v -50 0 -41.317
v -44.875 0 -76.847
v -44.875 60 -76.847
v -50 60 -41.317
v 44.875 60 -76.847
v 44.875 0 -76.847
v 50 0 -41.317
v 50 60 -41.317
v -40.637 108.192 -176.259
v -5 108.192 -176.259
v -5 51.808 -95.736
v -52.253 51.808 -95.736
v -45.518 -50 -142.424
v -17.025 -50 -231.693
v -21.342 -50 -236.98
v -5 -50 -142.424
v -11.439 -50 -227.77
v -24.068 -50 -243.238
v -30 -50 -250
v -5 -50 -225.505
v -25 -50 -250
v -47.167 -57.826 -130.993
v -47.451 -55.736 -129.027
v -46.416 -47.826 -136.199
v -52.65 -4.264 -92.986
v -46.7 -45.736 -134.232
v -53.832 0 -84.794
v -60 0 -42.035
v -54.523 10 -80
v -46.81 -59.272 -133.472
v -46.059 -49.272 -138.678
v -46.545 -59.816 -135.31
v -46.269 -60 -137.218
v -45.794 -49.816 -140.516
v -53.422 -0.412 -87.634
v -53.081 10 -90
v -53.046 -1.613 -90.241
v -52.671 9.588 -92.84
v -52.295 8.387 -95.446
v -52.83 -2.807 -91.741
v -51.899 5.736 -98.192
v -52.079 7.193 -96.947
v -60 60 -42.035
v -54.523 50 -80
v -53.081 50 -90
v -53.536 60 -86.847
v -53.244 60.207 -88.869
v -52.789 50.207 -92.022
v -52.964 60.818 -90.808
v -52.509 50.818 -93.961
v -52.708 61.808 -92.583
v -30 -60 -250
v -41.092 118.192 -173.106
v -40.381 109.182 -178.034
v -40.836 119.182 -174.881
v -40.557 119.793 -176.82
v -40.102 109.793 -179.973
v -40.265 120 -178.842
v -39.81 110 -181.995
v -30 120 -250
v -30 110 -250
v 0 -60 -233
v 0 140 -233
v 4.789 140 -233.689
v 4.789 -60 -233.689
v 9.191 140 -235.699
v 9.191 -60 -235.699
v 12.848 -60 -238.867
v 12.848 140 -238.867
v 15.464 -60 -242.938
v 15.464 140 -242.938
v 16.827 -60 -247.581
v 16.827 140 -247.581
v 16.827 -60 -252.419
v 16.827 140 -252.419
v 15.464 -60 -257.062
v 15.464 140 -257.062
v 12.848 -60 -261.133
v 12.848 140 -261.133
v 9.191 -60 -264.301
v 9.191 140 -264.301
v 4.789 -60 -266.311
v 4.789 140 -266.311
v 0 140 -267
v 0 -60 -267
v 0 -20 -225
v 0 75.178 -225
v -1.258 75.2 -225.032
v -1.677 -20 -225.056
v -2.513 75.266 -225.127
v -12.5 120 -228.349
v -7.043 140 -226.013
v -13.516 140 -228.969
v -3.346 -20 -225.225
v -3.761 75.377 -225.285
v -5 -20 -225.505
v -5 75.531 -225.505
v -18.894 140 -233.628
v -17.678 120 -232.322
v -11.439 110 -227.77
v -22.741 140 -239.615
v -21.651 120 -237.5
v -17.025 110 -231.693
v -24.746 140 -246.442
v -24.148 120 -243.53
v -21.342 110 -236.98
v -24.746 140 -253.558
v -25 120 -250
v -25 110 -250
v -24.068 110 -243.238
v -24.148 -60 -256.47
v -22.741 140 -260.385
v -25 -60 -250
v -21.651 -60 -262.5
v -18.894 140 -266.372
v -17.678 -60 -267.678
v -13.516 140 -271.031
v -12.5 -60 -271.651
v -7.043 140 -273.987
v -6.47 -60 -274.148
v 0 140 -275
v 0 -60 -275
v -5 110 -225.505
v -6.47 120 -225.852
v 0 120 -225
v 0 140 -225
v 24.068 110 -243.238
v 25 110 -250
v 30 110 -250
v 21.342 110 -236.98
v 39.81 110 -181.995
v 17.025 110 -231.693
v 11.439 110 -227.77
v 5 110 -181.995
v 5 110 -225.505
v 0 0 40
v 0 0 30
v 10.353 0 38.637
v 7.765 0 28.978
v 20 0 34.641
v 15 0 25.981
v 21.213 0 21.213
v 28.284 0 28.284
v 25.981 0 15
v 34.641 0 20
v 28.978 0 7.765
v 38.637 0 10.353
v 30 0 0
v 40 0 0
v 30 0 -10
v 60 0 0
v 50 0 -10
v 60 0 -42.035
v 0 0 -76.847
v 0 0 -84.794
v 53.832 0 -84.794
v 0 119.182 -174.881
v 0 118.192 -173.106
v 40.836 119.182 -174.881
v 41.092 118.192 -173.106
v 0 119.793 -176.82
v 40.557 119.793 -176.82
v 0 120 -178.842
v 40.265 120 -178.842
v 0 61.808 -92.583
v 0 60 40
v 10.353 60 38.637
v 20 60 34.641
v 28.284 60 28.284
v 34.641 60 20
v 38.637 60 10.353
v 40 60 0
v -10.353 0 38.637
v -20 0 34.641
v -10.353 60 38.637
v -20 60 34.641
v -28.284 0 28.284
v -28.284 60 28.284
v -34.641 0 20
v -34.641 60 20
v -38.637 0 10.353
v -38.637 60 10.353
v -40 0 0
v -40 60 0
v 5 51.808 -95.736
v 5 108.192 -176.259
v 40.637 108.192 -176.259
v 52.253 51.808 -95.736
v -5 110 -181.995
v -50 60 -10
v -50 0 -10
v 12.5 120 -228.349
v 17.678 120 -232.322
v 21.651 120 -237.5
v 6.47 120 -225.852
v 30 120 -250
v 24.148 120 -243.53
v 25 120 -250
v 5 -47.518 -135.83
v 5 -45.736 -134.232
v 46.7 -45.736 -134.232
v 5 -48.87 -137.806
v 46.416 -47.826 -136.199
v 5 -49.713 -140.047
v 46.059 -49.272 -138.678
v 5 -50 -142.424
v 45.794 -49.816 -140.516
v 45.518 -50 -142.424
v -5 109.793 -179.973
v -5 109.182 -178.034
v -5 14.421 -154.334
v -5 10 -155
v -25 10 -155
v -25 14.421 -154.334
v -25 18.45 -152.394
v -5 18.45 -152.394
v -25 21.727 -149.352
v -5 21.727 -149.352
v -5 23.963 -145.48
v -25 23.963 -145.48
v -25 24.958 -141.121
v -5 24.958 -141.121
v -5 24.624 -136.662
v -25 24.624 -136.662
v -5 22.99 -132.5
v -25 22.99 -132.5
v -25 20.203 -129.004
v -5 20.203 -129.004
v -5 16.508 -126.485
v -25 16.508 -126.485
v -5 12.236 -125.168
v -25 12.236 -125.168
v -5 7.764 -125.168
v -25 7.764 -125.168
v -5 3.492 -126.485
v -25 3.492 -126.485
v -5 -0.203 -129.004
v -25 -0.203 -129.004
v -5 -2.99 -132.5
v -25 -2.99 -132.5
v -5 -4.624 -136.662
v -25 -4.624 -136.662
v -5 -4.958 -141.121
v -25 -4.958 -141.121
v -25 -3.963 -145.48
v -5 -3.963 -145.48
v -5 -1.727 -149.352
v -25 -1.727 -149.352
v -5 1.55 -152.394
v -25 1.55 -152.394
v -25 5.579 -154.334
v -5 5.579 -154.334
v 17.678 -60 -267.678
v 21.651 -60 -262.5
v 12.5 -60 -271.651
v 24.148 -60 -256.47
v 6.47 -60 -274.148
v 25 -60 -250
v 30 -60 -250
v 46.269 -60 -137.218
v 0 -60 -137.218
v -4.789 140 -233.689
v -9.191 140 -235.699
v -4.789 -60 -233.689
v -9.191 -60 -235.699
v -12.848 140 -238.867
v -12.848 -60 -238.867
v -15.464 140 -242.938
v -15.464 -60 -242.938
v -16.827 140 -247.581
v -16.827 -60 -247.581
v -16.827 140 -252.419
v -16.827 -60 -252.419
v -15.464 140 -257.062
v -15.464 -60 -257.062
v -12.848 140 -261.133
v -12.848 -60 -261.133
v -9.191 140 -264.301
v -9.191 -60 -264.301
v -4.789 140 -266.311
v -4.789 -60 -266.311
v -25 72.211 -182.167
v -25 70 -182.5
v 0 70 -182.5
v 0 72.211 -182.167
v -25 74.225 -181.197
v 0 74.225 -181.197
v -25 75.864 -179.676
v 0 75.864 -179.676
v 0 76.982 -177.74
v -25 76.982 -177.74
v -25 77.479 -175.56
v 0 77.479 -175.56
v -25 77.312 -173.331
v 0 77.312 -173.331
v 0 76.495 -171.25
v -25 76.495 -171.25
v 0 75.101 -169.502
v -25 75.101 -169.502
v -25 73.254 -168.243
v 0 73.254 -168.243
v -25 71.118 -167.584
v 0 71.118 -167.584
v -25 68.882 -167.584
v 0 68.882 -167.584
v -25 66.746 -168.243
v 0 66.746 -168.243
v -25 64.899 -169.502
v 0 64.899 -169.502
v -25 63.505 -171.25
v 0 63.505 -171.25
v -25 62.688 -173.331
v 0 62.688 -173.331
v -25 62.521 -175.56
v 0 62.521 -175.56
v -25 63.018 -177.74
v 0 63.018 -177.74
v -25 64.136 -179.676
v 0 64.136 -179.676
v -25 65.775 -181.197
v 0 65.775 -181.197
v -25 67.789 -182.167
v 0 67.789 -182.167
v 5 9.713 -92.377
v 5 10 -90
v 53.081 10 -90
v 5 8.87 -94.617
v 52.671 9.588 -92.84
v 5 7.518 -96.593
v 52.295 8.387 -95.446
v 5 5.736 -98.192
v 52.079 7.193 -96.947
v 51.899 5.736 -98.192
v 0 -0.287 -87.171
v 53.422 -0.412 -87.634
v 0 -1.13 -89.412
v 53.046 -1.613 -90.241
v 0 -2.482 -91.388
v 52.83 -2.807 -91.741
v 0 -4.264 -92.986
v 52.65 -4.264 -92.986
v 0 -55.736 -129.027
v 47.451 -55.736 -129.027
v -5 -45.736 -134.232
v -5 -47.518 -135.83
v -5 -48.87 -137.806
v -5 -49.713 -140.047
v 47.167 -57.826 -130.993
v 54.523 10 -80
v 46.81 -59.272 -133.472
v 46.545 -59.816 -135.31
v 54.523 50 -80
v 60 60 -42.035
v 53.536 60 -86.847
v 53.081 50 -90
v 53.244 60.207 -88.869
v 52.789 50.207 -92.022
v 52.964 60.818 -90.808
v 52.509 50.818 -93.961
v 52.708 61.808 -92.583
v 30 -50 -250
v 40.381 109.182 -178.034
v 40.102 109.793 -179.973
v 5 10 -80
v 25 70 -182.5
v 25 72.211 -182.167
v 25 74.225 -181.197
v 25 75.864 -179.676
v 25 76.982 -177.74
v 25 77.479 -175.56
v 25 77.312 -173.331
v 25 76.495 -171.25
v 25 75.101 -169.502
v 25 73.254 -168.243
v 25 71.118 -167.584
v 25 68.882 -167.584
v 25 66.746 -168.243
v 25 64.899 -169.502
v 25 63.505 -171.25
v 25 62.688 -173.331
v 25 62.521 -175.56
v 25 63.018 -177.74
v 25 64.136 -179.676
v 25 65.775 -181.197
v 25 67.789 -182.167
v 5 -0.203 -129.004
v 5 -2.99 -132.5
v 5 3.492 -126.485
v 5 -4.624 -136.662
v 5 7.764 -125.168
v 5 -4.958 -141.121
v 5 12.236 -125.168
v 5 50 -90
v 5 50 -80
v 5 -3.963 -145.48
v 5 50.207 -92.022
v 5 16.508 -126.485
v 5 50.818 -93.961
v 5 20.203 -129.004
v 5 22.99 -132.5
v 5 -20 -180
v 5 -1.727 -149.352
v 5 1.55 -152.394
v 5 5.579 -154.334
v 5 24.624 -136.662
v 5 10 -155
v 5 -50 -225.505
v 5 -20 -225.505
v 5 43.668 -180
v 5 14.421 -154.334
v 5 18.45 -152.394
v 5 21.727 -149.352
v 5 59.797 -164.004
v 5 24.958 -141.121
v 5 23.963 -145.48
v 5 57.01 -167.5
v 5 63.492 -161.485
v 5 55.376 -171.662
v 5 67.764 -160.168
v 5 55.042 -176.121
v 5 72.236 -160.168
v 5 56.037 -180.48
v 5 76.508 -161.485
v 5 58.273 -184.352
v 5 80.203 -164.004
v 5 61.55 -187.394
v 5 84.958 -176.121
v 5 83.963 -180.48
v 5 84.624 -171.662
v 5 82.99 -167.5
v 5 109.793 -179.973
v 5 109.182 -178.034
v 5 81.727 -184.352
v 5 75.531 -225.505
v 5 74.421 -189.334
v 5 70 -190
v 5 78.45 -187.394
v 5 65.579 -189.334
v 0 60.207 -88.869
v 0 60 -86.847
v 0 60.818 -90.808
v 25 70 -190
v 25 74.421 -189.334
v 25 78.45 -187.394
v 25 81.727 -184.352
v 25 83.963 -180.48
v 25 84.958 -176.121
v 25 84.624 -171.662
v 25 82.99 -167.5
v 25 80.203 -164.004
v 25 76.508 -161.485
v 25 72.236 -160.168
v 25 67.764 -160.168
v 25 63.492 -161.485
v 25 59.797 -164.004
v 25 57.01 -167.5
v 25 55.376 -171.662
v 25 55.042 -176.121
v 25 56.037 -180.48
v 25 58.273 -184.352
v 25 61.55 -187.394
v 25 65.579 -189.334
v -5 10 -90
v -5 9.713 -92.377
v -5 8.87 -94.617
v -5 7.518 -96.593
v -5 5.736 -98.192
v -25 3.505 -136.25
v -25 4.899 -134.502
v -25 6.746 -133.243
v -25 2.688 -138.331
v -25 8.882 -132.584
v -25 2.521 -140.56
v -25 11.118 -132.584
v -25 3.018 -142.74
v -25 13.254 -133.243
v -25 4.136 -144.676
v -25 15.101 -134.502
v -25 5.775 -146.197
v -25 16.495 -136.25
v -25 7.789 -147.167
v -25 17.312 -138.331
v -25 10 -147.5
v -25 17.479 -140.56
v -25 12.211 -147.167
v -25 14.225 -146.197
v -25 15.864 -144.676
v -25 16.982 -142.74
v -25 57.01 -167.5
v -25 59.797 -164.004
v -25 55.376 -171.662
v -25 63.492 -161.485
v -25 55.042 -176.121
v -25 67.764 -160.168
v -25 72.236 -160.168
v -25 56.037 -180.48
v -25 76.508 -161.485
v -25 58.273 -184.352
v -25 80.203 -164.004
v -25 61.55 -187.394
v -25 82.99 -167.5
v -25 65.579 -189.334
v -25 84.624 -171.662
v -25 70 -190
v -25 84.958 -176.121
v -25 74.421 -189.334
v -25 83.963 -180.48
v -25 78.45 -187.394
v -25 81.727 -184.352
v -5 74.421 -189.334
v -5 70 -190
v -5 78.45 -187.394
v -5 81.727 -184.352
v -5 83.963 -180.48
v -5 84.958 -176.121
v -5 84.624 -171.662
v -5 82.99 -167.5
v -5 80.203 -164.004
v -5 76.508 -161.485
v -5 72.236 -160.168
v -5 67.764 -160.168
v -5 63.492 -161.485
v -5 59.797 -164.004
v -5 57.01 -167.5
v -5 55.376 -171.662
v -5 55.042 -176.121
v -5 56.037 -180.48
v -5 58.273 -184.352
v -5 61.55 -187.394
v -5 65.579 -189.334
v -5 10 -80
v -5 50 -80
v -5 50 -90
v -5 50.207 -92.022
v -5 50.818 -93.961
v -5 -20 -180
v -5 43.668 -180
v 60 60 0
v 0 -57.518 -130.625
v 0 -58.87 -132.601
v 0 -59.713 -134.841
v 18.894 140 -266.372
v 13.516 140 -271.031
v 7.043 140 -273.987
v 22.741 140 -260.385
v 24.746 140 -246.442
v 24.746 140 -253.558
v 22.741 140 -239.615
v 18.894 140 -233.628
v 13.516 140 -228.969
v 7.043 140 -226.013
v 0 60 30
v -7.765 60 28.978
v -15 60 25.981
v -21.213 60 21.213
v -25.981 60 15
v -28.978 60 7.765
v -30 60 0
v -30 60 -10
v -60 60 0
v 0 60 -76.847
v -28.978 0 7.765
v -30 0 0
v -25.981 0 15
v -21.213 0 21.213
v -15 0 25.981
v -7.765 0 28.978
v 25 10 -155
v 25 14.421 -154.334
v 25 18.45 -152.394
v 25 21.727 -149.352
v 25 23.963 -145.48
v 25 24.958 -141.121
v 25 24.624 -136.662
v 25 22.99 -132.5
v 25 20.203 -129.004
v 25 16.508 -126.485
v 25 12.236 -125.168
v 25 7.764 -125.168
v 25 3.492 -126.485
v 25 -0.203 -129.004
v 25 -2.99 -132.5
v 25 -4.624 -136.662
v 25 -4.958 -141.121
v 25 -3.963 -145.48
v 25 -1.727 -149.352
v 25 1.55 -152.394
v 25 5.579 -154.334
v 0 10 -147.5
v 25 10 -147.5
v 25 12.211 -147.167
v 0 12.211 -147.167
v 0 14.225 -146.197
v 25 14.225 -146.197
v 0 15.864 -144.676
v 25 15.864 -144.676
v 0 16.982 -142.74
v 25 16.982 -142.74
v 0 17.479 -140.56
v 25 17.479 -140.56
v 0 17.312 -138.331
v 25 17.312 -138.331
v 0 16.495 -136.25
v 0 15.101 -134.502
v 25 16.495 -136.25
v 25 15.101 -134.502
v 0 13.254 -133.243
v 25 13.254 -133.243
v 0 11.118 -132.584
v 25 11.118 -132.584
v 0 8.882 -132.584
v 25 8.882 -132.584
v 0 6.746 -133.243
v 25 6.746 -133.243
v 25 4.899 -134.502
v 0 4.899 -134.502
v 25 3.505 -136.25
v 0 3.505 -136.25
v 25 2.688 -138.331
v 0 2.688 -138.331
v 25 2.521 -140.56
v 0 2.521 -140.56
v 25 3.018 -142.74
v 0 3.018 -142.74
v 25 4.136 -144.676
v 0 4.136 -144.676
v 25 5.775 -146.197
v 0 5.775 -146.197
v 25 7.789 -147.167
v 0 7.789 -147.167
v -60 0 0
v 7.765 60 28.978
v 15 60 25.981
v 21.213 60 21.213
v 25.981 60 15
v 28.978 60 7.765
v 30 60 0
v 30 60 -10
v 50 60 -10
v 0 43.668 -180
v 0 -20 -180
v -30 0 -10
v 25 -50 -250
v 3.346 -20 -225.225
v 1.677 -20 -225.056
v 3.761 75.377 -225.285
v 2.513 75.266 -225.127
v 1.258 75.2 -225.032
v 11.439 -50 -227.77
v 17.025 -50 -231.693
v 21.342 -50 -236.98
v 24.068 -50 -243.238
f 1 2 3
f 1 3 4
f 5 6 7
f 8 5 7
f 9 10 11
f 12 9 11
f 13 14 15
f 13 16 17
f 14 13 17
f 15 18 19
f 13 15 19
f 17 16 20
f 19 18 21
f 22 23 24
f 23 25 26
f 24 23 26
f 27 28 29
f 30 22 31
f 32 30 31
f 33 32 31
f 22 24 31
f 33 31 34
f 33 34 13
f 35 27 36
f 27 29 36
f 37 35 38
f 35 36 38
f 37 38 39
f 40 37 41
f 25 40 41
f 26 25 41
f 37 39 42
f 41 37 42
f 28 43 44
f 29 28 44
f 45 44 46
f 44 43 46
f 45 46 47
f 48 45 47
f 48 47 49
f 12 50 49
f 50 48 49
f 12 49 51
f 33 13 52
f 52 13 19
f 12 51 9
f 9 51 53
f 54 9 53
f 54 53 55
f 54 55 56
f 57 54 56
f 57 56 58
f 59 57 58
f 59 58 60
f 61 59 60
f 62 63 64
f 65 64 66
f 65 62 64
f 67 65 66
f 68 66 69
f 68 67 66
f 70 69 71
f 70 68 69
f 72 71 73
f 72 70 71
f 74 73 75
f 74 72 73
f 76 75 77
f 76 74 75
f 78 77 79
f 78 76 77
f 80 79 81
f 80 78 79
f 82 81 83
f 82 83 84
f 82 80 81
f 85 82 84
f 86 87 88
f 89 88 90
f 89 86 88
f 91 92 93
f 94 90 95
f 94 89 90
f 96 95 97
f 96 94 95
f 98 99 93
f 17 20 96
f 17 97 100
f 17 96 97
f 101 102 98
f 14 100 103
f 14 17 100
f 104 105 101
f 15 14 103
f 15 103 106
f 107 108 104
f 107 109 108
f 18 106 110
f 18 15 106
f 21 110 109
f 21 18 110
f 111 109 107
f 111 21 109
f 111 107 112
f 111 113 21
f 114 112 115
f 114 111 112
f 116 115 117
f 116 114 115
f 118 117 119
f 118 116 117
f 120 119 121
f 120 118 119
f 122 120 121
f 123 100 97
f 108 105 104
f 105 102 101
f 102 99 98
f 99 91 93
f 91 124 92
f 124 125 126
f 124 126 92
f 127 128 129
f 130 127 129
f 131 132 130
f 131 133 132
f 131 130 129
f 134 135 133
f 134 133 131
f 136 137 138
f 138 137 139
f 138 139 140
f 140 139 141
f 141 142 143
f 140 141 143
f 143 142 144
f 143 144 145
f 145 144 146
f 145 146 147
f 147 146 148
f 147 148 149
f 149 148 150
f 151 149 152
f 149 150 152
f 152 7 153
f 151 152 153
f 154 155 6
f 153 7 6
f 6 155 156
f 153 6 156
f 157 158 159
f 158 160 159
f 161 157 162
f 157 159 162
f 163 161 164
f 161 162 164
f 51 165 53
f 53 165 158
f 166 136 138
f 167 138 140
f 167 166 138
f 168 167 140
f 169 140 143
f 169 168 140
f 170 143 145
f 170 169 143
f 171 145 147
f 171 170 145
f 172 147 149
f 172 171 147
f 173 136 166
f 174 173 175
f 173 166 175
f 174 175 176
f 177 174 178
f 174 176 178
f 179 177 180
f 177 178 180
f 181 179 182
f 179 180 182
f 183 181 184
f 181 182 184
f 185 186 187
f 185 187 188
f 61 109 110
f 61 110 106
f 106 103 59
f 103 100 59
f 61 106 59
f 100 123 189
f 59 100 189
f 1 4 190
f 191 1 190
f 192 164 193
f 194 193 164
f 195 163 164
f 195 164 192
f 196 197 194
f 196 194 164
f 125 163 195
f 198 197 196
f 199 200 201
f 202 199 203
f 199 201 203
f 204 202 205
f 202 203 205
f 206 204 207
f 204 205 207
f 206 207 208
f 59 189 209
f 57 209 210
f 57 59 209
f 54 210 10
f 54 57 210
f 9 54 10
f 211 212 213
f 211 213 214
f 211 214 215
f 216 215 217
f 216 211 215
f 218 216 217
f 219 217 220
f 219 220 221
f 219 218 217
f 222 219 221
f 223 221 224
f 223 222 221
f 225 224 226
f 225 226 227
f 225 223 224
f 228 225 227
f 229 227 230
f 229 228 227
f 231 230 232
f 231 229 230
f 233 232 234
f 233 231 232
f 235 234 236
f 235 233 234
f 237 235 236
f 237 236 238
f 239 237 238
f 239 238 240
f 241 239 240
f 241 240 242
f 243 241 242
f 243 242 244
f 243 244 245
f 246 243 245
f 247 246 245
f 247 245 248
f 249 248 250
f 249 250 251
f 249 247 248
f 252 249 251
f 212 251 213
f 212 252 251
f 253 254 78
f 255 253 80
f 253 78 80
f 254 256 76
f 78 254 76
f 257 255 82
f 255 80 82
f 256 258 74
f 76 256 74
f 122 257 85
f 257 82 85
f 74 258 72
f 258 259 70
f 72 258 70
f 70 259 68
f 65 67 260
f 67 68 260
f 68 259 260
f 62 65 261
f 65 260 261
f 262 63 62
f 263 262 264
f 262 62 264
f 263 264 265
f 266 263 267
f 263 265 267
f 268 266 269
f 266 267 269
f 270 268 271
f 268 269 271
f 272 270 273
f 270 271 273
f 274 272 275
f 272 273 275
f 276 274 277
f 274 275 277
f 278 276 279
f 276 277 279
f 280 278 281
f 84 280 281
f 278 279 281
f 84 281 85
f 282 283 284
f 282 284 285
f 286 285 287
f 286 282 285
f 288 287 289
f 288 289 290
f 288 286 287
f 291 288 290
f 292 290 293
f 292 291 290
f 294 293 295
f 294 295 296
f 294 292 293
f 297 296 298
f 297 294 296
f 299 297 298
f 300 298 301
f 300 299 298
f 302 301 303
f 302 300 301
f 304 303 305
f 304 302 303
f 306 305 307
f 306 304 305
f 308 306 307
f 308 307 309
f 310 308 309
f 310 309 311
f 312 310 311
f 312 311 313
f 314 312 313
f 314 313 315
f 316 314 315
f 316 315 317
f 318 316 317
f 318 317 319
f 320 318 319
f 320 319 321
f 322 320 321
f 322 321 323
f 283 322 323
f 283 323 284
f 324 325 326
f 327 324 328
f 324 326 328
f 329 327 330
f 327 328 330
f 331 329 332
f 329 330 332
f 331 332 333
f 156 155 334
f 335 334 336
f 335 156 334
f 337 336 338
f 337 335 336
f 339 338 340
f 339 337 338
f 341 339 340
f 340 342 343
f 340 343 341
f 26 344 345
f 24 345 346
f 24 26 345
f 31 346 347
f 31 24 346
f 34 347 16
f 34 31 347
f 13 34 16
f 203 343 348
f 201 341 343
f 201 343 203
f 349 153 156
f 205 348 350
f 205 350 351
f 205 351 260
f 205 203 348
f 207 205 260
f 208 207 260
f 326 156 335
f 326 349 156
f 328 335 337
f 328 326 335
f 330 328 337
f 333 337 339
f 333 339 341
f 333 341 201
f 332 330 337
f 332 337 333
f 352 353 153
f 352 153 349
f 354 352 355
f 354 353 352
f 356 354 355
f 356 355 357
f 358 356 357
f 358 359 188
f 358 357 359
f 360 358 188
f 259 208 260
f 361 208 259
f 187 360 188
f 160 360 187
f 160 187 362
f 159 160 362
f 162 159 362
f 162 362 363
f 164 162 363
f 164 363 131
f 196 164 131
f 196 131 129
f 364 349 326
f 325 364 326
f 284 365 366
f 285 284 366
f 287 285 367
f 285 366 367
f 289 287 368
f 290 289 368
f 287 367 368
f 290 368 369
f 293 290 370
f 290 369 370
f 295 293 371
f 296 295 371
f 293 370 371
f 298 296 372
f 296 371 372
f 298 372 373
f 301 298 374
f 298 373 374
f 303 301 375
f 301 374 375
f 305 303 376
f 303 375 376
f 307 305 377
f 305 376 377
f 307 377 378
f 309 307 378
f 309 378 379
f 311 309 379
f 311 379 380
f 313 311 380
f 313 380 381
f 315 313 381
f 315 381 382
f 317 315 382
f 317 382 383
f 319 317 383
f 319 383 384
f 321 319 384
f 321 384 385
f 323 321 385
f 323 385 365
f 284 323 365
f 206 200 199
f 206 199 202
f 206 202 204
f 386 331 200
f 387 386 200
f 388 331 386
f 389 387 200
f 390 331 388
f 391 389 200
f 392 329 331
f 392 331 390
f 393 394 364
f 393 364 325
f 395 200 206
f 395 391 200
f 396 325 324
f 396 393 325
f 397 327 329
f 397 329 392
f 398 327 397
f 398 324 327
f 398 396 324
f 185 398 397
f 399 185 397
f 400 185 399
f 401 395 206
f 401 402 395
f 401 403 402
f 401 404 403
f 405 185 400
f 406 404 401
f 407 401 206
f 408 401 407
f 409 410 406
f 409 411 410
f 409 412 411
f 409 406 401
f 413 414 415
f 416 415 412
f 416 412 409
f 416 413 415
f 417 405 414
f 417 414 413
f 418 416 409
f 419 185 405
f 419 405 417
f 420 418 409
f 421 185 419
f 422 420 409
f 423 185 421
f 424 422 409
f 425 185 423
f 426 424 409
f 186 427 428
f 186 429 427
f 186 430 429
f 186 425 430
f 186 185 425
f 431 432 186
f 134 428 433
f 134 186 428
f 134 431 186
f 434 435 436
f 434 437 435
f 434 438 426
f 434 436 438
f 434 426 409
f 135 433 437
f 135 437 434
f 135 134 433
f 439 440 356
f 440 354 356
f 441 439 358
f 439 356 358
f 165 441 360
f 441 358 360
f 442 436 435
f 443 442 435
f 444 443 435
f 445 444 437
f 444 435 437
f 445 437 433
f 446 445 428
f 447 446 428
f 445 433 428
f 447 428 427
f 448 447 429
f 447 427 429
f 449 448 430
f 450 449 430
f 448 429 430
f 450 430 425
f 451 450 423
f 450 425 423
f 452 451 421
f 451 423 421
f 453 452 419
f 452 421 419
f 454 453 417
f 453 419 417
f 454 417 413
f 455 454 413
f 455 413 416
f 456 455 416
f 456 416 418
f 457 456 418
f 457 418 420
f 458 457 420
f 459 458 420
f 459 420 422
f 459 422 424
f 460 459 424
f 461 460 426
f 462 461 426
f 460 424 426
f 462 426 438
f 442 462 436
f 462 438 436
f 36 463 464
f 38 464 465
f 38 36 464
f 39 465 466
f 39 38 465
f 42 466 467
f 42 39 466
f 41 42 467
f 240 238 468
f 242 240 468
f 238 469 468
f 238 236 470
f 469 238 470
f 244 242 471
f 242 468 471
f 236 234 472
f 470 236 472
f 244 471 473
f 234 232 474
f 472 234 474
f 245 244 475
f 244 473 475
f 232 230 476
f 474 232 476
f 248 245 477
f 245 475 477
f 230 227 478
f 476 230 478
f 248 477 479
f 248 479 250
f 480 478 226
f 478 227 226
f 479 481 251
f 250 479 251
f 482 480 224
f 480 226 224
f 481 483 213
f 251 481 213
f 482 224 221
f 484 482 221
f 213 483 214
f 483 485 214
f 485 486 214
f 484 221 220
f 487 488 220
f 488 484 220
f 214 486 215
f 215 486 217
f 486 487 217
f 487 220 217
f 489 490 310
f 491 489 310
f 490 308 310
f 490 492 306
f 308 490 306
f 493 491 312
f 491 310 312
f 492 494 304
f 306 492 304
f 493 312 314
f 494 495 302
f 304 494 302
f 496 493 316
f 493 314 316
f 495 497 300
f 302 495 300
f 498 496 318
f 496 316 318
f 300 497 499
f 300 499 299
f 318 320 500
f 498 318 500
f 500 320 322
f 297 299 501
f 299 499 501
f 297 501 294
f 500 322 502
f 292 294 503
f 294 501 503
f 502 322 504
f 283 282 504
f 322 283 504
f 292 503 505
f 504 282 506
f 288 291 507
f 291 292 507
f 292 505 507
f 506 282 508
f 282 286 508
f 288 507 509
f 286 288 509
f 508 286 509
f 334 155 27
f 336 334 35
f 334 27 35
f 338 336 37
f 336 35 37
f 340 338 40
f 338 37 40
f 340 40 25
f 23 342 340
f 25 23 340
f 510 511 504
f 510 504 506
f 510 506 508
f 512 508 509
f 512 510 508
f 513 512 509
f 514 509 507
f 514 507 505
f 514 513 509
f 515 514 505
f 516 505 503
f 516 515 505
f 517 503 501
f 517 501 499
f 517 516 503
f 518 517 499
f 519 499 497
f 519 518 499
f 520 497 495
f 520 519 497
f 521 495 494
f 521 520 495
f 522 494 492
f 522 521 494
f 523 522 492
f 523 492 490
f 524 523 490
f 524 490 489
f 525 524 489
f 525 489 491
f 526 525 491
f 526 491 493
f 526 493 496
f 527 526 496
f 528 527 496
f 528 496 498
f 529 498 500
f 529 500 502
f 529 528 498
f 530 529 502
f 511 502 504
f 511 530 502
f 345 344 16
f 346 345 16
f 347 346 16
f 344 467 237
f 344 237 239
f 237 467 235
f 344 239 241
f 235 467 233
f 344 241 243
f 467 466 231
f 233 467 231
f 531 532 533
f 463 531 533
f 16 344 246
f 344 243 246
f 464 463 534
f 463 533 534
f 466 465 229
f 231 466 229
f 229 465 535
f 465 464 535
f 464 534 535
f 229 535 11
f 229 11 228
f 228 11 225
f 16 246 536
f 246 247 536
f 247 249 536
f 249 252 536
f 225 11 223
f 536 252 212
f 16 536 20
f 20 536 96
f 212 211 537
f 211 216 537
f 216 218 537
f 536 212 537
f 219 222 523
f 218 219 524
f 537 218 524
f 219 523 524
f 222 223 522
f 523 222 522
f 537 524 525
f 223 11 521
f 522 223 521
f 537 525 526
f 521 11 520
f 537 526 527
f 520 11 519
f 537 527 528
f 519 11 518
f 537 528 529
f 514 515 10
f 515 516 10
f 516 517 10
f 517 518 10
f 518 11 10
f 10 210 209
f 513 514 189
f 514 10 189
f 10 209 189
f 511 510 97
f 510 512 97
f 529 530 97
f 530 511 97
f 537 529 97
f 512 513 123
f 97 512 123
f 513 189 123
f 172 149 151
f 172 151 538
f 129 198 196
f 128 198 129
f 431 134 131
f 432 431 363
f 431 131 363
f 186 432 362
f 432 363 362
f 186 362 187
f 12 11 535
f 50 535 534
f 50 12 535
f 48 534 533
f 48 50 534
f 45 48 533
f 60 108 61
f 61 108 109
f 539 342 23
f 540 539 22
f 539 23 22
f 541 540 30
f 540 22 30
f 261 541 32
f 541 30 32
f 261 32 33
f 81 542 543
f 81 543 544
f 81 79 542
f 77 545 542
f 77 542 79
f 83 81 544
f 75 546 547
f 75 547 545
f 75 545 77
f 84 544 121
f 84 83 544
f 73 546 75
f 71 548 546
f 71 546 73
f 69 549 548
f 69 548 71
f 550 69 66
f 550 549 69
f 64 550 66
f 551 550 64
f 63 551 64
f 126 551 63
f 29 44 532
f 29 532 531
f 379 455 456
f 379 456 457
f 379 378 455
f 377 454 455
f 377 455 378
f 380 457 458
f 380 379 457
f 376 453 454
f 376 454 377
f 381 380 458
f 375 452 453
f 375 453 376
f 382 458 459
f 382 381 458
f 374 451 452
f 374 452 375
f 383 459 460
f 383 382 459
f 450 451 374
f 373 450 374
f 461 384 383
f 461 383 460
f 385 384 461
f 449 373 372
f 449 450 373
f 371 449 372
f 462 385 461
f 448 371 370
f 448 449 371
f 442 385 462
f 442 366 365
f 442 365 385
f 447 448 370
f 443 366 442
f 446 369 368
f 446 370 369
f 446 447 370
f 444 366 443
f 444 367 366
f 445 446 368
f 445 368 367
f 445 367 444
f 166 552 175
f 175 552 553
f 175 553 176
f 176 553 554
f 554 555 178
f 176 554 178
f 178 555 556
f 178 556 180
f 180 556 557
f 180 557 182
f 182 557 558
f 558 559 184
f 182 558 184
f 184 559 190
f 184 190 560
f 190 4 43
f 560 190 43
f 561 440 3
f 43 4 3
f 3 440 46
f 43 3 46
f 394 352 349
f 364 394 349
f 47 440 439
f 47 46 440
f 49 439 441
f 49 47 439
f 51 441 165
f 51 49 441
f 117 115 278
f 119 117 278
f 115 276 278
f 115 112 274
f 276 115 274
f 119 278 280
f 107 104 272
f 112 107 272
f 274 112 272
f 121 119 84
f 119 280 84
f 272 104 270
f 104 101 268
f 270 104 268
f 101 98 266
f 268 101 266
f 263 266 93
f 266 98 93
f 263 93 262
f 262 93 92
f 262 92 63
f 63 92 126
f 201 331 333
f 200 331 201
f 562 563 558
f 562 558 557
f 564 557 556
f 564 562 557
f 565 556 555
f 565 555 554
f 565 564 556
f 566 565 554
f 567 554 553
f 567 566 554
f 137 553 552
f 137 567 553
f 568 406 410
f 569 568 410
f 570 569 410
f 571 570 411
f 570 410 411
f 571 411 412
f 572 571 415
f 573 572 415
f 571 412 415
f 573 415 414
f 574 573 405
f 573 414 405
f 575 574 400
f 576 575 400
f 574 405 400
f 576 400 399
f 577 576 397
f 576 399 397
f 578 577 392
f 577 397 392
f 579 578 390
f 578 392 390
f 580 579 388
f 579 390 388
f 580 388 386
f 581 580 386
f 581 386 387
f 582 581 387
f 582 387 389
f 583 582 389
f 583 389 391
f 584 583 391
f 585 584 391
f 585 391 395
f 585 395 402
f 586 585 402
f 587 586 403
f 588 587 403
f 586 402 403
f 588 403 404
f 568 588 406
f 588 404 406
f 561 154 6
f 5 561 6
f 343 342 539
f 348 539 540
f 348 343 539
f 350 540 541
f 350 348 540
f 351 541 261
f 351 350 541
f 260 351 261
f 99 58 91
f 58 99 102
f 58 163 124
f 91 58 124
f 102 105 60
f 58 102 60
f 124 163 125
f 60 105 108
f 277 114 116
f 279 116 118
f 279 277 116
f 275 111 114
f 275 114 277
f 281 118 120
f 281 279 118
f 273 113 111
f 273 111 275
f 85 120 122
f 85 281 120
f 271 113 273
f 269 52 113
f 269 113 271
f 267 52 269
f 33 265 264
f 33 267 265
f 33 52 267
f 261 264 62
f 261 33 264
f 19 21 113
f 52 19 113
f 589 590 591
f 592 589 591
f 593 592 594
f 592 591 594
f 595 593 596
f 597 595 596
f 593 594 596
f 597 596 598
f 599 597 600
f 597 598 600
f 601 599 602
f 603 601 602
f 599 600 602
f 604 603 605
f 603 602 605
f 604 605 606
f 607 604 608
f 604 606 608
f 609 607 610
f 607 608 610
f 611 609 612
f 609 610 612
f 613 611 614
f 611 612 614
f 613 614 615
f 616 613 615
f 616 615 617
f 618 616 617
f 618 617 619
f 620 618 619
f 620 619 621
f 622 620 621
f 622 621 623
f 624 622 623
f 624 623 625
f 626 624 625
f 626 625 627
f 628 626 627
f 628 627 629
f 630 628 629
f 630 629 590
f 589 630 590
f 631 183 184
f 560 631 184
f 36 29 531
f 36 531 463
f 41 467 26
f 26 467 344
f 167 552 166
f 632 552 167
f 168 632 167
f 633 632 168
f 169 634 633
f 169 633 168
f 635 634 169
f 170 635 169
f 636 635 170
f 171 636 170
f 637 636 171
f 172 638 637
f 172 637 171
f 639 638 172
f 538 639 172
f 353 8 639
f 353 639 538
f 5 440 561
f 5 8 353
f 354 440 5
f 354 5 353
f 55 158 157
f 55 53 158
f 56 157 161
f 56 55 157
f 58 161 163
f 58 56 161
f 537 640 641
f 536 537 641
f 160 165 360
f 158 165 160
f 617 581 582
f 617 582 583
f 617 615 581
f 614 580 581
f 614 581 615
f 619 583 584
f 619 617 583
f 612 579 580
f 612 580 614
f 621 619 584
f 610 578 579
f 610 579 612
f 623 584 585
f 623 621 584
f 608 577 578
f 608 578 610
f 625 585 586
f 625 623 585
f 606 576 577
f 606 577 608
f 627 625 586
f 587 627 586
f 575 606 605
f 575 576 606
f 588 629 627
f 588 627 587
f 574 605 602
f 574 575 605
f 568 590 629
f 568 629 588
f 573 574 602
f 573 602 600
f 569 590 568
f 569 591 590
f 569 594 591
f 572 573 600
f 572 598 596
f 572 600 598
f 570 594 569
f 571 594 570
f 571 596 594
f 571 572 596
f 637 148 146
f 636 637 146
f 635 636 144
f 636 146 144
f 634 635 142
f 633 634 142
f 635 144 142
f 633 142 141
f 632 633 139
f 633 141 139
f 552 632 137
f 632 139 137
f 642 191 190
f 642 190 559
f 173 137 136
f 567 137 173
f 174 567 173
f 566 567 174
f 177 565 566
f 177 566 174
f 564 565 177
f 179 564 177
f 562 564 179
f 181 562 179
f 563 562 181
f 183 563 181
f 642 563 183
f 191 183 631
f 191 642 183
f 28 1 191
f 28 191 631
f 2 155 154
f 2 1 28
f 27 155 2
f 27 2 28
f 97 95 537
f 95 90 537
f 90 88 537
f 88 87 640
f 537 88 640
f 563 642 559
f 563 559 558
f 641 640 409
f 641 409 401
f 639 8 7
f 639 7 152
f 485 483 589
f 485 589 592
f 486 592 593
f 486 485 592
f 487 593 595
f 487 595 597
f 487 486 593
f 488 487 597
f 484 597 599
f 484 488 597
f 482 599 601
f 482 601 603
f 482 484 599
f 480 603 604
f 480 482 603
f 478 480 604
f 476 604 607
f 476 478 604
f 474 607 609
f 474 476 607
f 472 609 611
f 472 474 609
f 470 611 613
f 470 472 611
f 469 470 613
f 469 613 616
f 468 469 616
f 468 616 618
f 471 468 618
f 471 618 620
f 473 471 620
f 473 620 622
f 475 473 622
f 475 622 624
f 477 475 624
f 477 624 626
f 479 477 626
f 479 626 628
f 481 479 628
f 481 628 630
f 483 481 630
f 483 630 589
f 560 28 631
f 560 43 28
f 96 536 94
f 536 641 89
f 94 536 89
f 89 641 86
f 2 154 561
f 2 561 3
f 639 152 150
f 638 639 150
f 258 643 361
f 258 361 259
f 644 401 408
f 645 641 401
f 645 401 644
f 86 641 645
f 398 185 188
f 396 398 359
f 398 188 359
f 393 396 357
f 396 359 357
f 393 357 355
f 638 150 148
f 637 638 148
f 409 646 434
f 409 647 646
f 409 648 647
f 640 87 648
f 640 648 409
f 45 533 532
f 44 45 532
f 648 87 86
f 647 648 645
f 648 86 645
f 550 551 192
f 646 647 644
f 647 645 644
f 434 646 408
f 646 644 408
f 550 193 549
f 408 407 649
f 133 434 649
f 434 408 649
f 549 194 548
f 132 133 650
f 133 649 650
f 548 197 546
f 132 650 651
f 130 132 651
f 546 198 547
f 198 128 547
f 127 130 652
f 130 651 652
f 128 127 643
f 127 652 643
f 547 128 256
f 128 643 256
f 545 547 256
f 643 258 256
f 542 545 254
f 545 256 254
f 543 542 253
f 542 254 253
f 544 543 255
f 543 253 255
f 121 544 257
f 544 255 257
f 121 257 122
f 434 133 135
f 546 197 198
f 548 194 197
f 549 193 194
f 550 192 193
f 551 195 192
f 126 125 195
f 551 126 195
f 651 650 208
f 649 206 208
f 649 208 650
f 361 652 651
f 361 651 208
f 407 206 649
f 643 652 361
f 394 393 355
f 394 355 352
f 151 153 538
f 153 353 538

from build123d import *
from build123d.topology import SkipClean

# Parameters (mm, degrees)
BOSS_EXTRUDE1_DEPTH     = 60
CUT_EXTRUDE1_DEPTH      = 314.84709653
CUT_EXTRUDE2_REACH      = 290.725
CUT_EXTRUDE2_START      = 5
FILLET1_R               = 10
BOSS_EXTRUDE4_DEPTH     = 60
BOSS_EXTRUDE2_DEPTH     = 200
CUT_EXTRUDE3_DEPTH      = 306.982025616
CUT_EXTRUDE3_DEPTH_BACK = 306.982025616
SKETCH5_R               = 17
SKETCH6_R               = 15
BOSS_EXTRUDE3_DEPTH     = 20
CUT_EXTRUDE4_REACH      = 312.564
SKETCH7_R               = 7.5


with BuildPart() as part:
    # Sketch1 → Boss-Extrude1 (new body)
    with BuildSketch(Plane(origin=(0, 0, 0), x_dir=(0, 0, -1), z_dir=(1, 0, 0))):
        Polygon((0, 0), (0, 60), (90, 60), (175.688880405, 120), (250, 120), (250, 92.682857844), (180, 43.668330169), (180, -20), (250, -20), (250, -60), (132.012452293, -60), (90, 0), align=None)
    extrude(amount=BOSS_EXTRUDE1_DEPTH)

    # Sketch2 → Cut-Extrude1 (cut, through all)
    with BuildSketch(Plane(origin=(0, 120, 0), x_dir=(1, 0, 0), z_dir=(0, 1, 0))):
        Polygon((60, 42.034783703), (30, 250), (60, 250), align=None)
    extrude(amount=-CUT_EXTRUDE1_DEPTH, mode=Mode.SUBTRACT)

    # Cut-Extrude2: up to this plane
    cut_extrude2_end = Plane(origin=(60, -60, -42.034783703), z_dir=(-0.9897548850976273, 0, 0.1427769849288831))
    # Sketch4 → Cut-Extrude2 (cut, up to the surface)
    with BuildSketch(Plane(origin=(0, 0, 0), x_dir=(0, 0, -1), z_dir=(1, 0, 0)).offset(CUT_EXTRUDE2_START), mode=Mode.PRIVATE) as cut_extrude2_sk1:
        Polygon((80, 50), (80, 10), (95.205670506, 10), (137.218122798, -50), (250, -50), (250, 110), (178.841868293, 110), (93.152987889, 50), align=None)
    cut_extrude2_tool1 = split(extrude(cut_extrude2_sk1.sketch, amount=CUT_EXTRUDE2_REACH, mode=Mode.PRIVATE), bisect_by=cut_extrude2_end, keep=Keep.BOTH, mode=Mode.PRIVATE)
    add(cut_extrude2_tool1.solids().sort_by_distance((5, 26.655834, -179.495855))[0], mode=Mode.SUBTRACT)

    # Fillet1
    fillet1_edges = [part.edges().sort_by_distance(p)[0] for p in [
        (26.540391431, 60, -90),
        (20.359871299, 120, -175.688880405),
        (23.510140528, -60, -132.012452293),
        (26.540391431, 0, -90),
        (28.66491971, 10, -95.205670506),
        (25.634668807, -50, -137.218122798),
        (22.632454334, 110, -178.841868293),
        (28.812974465, 50, -93.152987889),
    ]]
    fillet(fillet1_edges, radius=FILLET1_R)

    # Sketch8 → Boss-Extrude4 (add)
    with BuildSketch(Plane(origin=(0, 60, 0), x_dir=(1, 0, 0), z_dir=(0, 1, 0))):
        with BuildLine():
            Line((0, 0), (0, -40))
            ThreePointArc((0, -40), (28.284271247, -28.284271247), (40, 0))
            Line((40, 0), (0, 0))
        make_face()
    extrude(amount=-BOSS_EXTRUDE4_DEPTH)

    # Sketch3 → Boss-Extrude2 (add)
    with BuildSketch(Plane.XZ.offset(60)):
        with BuildLine():
            Line((0, -275), (0, -225))
            ThreePointArc((0, -225), (25, -250), (0, -275))
        make_face()
    extrude(amount=-BOSS_EXTRUDE2_DEPTH)

    # Sketch5 → Cut-Extrude3 (cut, two sides: drawn at the far end of the back side and taken through both)
    with BuildSketch(Plane(origin=(0, 60, 0), x_dir=(1, 0, 0), z_dir=(0, 1, 0)).offset(-CUT_EXTRUDE3_DEPTH_BACK)):
        with Locations((0, 250)):
            Circle(SKETCH5_R)
        with BuildLine():
            Line((40, 10), (30, 10))
            Line((30, 10), (30, 0))
            ThreePointArc((30, 0), (21.213203436, -21.213203436), (0, -30))
            Line((0, -30), (0, 76.847012111))
            Line((0, 76.847012111), (44.874654082, 76.847012111))
            Line((44.874654082, 76.847012111), (50, 41.317223033))
            Line((50, 41.317223033), (50, 10))
            Line((50, 10), (40, 10))
        make_face()
    extrude(amount=CUT_EXTRUDE3_DEPTH + CUT_EXTRUDE3_DEPTH_BACK, mode=Mode.SUBTRACT)

    # Sketch6 → Boss-Extrude3 (add)
    with BuildSketch(Plane(origin=(5, 0, 0), x_dir=(0, 0, -1), z_dir=(1, 0, 0))):
        with Locations((175, 70)):
            Circle(SKETCH6_R)
        with Locations((140, 10)):
            Circle(SKETCH6_R)
    extrude(amount=BOSS_EXTRUDE3_DEPTH)

    # Sketch7 → Cut-Extrude4 (cut, up to next)
    with BuildSketch(Plane(origin=(25, 0, 0), x_dir=(0, 0, -1), z_dir=(1, 0, 0)), mode=Mode.PRIVATE) as cut_extrude4_sk1:
        with Locations((140, 10)):
            Circle(SKETCH7_R)
    cut_extrude4_tool1 = extrude(cut_extrude4_sk1.sketch, amount=-CUT_EXTRUDE4_REACH, mode=Mode.PRIVATE) & part.part
    # Sketch7 → Cut-Extrude4 (cut, up to next)
    with BuildSketch(Plane(origin=(25, 0, 0), x_dir=(0, 0, -1), z_dir=(1, 0, 0)), mode=Mode.PRIVATE) as cut_extrude4_sk2:
        with Locations((175, 70)):
            Circle(SKETCH7_R)
    cut_extrude4_tool2 = extrude(cut_extrude4_sk2.sketch, amount=-CUT_EXTRUDE4_REACH, mode=Mode.PRIVATE) & part.part
    add(cut_extrude4_tool1.solids().sort_by_distance((25, 10, -140))[0], mode=Mode.SUBTRACT)
    add(cut_extrude4_tool2.solids().sort_by_distance((25, 70, -175))[0], mode=Mode.SUBTRACT)

    # Mirror2: part across plane


with BuildPart() as part_1:
    with SkipClean():  # the faces are left unmerged after this step: merging them gives an invalid solid
        add(part.part)
        add(part.part.mirror(Plane.ZY))


solid = part_1.part
